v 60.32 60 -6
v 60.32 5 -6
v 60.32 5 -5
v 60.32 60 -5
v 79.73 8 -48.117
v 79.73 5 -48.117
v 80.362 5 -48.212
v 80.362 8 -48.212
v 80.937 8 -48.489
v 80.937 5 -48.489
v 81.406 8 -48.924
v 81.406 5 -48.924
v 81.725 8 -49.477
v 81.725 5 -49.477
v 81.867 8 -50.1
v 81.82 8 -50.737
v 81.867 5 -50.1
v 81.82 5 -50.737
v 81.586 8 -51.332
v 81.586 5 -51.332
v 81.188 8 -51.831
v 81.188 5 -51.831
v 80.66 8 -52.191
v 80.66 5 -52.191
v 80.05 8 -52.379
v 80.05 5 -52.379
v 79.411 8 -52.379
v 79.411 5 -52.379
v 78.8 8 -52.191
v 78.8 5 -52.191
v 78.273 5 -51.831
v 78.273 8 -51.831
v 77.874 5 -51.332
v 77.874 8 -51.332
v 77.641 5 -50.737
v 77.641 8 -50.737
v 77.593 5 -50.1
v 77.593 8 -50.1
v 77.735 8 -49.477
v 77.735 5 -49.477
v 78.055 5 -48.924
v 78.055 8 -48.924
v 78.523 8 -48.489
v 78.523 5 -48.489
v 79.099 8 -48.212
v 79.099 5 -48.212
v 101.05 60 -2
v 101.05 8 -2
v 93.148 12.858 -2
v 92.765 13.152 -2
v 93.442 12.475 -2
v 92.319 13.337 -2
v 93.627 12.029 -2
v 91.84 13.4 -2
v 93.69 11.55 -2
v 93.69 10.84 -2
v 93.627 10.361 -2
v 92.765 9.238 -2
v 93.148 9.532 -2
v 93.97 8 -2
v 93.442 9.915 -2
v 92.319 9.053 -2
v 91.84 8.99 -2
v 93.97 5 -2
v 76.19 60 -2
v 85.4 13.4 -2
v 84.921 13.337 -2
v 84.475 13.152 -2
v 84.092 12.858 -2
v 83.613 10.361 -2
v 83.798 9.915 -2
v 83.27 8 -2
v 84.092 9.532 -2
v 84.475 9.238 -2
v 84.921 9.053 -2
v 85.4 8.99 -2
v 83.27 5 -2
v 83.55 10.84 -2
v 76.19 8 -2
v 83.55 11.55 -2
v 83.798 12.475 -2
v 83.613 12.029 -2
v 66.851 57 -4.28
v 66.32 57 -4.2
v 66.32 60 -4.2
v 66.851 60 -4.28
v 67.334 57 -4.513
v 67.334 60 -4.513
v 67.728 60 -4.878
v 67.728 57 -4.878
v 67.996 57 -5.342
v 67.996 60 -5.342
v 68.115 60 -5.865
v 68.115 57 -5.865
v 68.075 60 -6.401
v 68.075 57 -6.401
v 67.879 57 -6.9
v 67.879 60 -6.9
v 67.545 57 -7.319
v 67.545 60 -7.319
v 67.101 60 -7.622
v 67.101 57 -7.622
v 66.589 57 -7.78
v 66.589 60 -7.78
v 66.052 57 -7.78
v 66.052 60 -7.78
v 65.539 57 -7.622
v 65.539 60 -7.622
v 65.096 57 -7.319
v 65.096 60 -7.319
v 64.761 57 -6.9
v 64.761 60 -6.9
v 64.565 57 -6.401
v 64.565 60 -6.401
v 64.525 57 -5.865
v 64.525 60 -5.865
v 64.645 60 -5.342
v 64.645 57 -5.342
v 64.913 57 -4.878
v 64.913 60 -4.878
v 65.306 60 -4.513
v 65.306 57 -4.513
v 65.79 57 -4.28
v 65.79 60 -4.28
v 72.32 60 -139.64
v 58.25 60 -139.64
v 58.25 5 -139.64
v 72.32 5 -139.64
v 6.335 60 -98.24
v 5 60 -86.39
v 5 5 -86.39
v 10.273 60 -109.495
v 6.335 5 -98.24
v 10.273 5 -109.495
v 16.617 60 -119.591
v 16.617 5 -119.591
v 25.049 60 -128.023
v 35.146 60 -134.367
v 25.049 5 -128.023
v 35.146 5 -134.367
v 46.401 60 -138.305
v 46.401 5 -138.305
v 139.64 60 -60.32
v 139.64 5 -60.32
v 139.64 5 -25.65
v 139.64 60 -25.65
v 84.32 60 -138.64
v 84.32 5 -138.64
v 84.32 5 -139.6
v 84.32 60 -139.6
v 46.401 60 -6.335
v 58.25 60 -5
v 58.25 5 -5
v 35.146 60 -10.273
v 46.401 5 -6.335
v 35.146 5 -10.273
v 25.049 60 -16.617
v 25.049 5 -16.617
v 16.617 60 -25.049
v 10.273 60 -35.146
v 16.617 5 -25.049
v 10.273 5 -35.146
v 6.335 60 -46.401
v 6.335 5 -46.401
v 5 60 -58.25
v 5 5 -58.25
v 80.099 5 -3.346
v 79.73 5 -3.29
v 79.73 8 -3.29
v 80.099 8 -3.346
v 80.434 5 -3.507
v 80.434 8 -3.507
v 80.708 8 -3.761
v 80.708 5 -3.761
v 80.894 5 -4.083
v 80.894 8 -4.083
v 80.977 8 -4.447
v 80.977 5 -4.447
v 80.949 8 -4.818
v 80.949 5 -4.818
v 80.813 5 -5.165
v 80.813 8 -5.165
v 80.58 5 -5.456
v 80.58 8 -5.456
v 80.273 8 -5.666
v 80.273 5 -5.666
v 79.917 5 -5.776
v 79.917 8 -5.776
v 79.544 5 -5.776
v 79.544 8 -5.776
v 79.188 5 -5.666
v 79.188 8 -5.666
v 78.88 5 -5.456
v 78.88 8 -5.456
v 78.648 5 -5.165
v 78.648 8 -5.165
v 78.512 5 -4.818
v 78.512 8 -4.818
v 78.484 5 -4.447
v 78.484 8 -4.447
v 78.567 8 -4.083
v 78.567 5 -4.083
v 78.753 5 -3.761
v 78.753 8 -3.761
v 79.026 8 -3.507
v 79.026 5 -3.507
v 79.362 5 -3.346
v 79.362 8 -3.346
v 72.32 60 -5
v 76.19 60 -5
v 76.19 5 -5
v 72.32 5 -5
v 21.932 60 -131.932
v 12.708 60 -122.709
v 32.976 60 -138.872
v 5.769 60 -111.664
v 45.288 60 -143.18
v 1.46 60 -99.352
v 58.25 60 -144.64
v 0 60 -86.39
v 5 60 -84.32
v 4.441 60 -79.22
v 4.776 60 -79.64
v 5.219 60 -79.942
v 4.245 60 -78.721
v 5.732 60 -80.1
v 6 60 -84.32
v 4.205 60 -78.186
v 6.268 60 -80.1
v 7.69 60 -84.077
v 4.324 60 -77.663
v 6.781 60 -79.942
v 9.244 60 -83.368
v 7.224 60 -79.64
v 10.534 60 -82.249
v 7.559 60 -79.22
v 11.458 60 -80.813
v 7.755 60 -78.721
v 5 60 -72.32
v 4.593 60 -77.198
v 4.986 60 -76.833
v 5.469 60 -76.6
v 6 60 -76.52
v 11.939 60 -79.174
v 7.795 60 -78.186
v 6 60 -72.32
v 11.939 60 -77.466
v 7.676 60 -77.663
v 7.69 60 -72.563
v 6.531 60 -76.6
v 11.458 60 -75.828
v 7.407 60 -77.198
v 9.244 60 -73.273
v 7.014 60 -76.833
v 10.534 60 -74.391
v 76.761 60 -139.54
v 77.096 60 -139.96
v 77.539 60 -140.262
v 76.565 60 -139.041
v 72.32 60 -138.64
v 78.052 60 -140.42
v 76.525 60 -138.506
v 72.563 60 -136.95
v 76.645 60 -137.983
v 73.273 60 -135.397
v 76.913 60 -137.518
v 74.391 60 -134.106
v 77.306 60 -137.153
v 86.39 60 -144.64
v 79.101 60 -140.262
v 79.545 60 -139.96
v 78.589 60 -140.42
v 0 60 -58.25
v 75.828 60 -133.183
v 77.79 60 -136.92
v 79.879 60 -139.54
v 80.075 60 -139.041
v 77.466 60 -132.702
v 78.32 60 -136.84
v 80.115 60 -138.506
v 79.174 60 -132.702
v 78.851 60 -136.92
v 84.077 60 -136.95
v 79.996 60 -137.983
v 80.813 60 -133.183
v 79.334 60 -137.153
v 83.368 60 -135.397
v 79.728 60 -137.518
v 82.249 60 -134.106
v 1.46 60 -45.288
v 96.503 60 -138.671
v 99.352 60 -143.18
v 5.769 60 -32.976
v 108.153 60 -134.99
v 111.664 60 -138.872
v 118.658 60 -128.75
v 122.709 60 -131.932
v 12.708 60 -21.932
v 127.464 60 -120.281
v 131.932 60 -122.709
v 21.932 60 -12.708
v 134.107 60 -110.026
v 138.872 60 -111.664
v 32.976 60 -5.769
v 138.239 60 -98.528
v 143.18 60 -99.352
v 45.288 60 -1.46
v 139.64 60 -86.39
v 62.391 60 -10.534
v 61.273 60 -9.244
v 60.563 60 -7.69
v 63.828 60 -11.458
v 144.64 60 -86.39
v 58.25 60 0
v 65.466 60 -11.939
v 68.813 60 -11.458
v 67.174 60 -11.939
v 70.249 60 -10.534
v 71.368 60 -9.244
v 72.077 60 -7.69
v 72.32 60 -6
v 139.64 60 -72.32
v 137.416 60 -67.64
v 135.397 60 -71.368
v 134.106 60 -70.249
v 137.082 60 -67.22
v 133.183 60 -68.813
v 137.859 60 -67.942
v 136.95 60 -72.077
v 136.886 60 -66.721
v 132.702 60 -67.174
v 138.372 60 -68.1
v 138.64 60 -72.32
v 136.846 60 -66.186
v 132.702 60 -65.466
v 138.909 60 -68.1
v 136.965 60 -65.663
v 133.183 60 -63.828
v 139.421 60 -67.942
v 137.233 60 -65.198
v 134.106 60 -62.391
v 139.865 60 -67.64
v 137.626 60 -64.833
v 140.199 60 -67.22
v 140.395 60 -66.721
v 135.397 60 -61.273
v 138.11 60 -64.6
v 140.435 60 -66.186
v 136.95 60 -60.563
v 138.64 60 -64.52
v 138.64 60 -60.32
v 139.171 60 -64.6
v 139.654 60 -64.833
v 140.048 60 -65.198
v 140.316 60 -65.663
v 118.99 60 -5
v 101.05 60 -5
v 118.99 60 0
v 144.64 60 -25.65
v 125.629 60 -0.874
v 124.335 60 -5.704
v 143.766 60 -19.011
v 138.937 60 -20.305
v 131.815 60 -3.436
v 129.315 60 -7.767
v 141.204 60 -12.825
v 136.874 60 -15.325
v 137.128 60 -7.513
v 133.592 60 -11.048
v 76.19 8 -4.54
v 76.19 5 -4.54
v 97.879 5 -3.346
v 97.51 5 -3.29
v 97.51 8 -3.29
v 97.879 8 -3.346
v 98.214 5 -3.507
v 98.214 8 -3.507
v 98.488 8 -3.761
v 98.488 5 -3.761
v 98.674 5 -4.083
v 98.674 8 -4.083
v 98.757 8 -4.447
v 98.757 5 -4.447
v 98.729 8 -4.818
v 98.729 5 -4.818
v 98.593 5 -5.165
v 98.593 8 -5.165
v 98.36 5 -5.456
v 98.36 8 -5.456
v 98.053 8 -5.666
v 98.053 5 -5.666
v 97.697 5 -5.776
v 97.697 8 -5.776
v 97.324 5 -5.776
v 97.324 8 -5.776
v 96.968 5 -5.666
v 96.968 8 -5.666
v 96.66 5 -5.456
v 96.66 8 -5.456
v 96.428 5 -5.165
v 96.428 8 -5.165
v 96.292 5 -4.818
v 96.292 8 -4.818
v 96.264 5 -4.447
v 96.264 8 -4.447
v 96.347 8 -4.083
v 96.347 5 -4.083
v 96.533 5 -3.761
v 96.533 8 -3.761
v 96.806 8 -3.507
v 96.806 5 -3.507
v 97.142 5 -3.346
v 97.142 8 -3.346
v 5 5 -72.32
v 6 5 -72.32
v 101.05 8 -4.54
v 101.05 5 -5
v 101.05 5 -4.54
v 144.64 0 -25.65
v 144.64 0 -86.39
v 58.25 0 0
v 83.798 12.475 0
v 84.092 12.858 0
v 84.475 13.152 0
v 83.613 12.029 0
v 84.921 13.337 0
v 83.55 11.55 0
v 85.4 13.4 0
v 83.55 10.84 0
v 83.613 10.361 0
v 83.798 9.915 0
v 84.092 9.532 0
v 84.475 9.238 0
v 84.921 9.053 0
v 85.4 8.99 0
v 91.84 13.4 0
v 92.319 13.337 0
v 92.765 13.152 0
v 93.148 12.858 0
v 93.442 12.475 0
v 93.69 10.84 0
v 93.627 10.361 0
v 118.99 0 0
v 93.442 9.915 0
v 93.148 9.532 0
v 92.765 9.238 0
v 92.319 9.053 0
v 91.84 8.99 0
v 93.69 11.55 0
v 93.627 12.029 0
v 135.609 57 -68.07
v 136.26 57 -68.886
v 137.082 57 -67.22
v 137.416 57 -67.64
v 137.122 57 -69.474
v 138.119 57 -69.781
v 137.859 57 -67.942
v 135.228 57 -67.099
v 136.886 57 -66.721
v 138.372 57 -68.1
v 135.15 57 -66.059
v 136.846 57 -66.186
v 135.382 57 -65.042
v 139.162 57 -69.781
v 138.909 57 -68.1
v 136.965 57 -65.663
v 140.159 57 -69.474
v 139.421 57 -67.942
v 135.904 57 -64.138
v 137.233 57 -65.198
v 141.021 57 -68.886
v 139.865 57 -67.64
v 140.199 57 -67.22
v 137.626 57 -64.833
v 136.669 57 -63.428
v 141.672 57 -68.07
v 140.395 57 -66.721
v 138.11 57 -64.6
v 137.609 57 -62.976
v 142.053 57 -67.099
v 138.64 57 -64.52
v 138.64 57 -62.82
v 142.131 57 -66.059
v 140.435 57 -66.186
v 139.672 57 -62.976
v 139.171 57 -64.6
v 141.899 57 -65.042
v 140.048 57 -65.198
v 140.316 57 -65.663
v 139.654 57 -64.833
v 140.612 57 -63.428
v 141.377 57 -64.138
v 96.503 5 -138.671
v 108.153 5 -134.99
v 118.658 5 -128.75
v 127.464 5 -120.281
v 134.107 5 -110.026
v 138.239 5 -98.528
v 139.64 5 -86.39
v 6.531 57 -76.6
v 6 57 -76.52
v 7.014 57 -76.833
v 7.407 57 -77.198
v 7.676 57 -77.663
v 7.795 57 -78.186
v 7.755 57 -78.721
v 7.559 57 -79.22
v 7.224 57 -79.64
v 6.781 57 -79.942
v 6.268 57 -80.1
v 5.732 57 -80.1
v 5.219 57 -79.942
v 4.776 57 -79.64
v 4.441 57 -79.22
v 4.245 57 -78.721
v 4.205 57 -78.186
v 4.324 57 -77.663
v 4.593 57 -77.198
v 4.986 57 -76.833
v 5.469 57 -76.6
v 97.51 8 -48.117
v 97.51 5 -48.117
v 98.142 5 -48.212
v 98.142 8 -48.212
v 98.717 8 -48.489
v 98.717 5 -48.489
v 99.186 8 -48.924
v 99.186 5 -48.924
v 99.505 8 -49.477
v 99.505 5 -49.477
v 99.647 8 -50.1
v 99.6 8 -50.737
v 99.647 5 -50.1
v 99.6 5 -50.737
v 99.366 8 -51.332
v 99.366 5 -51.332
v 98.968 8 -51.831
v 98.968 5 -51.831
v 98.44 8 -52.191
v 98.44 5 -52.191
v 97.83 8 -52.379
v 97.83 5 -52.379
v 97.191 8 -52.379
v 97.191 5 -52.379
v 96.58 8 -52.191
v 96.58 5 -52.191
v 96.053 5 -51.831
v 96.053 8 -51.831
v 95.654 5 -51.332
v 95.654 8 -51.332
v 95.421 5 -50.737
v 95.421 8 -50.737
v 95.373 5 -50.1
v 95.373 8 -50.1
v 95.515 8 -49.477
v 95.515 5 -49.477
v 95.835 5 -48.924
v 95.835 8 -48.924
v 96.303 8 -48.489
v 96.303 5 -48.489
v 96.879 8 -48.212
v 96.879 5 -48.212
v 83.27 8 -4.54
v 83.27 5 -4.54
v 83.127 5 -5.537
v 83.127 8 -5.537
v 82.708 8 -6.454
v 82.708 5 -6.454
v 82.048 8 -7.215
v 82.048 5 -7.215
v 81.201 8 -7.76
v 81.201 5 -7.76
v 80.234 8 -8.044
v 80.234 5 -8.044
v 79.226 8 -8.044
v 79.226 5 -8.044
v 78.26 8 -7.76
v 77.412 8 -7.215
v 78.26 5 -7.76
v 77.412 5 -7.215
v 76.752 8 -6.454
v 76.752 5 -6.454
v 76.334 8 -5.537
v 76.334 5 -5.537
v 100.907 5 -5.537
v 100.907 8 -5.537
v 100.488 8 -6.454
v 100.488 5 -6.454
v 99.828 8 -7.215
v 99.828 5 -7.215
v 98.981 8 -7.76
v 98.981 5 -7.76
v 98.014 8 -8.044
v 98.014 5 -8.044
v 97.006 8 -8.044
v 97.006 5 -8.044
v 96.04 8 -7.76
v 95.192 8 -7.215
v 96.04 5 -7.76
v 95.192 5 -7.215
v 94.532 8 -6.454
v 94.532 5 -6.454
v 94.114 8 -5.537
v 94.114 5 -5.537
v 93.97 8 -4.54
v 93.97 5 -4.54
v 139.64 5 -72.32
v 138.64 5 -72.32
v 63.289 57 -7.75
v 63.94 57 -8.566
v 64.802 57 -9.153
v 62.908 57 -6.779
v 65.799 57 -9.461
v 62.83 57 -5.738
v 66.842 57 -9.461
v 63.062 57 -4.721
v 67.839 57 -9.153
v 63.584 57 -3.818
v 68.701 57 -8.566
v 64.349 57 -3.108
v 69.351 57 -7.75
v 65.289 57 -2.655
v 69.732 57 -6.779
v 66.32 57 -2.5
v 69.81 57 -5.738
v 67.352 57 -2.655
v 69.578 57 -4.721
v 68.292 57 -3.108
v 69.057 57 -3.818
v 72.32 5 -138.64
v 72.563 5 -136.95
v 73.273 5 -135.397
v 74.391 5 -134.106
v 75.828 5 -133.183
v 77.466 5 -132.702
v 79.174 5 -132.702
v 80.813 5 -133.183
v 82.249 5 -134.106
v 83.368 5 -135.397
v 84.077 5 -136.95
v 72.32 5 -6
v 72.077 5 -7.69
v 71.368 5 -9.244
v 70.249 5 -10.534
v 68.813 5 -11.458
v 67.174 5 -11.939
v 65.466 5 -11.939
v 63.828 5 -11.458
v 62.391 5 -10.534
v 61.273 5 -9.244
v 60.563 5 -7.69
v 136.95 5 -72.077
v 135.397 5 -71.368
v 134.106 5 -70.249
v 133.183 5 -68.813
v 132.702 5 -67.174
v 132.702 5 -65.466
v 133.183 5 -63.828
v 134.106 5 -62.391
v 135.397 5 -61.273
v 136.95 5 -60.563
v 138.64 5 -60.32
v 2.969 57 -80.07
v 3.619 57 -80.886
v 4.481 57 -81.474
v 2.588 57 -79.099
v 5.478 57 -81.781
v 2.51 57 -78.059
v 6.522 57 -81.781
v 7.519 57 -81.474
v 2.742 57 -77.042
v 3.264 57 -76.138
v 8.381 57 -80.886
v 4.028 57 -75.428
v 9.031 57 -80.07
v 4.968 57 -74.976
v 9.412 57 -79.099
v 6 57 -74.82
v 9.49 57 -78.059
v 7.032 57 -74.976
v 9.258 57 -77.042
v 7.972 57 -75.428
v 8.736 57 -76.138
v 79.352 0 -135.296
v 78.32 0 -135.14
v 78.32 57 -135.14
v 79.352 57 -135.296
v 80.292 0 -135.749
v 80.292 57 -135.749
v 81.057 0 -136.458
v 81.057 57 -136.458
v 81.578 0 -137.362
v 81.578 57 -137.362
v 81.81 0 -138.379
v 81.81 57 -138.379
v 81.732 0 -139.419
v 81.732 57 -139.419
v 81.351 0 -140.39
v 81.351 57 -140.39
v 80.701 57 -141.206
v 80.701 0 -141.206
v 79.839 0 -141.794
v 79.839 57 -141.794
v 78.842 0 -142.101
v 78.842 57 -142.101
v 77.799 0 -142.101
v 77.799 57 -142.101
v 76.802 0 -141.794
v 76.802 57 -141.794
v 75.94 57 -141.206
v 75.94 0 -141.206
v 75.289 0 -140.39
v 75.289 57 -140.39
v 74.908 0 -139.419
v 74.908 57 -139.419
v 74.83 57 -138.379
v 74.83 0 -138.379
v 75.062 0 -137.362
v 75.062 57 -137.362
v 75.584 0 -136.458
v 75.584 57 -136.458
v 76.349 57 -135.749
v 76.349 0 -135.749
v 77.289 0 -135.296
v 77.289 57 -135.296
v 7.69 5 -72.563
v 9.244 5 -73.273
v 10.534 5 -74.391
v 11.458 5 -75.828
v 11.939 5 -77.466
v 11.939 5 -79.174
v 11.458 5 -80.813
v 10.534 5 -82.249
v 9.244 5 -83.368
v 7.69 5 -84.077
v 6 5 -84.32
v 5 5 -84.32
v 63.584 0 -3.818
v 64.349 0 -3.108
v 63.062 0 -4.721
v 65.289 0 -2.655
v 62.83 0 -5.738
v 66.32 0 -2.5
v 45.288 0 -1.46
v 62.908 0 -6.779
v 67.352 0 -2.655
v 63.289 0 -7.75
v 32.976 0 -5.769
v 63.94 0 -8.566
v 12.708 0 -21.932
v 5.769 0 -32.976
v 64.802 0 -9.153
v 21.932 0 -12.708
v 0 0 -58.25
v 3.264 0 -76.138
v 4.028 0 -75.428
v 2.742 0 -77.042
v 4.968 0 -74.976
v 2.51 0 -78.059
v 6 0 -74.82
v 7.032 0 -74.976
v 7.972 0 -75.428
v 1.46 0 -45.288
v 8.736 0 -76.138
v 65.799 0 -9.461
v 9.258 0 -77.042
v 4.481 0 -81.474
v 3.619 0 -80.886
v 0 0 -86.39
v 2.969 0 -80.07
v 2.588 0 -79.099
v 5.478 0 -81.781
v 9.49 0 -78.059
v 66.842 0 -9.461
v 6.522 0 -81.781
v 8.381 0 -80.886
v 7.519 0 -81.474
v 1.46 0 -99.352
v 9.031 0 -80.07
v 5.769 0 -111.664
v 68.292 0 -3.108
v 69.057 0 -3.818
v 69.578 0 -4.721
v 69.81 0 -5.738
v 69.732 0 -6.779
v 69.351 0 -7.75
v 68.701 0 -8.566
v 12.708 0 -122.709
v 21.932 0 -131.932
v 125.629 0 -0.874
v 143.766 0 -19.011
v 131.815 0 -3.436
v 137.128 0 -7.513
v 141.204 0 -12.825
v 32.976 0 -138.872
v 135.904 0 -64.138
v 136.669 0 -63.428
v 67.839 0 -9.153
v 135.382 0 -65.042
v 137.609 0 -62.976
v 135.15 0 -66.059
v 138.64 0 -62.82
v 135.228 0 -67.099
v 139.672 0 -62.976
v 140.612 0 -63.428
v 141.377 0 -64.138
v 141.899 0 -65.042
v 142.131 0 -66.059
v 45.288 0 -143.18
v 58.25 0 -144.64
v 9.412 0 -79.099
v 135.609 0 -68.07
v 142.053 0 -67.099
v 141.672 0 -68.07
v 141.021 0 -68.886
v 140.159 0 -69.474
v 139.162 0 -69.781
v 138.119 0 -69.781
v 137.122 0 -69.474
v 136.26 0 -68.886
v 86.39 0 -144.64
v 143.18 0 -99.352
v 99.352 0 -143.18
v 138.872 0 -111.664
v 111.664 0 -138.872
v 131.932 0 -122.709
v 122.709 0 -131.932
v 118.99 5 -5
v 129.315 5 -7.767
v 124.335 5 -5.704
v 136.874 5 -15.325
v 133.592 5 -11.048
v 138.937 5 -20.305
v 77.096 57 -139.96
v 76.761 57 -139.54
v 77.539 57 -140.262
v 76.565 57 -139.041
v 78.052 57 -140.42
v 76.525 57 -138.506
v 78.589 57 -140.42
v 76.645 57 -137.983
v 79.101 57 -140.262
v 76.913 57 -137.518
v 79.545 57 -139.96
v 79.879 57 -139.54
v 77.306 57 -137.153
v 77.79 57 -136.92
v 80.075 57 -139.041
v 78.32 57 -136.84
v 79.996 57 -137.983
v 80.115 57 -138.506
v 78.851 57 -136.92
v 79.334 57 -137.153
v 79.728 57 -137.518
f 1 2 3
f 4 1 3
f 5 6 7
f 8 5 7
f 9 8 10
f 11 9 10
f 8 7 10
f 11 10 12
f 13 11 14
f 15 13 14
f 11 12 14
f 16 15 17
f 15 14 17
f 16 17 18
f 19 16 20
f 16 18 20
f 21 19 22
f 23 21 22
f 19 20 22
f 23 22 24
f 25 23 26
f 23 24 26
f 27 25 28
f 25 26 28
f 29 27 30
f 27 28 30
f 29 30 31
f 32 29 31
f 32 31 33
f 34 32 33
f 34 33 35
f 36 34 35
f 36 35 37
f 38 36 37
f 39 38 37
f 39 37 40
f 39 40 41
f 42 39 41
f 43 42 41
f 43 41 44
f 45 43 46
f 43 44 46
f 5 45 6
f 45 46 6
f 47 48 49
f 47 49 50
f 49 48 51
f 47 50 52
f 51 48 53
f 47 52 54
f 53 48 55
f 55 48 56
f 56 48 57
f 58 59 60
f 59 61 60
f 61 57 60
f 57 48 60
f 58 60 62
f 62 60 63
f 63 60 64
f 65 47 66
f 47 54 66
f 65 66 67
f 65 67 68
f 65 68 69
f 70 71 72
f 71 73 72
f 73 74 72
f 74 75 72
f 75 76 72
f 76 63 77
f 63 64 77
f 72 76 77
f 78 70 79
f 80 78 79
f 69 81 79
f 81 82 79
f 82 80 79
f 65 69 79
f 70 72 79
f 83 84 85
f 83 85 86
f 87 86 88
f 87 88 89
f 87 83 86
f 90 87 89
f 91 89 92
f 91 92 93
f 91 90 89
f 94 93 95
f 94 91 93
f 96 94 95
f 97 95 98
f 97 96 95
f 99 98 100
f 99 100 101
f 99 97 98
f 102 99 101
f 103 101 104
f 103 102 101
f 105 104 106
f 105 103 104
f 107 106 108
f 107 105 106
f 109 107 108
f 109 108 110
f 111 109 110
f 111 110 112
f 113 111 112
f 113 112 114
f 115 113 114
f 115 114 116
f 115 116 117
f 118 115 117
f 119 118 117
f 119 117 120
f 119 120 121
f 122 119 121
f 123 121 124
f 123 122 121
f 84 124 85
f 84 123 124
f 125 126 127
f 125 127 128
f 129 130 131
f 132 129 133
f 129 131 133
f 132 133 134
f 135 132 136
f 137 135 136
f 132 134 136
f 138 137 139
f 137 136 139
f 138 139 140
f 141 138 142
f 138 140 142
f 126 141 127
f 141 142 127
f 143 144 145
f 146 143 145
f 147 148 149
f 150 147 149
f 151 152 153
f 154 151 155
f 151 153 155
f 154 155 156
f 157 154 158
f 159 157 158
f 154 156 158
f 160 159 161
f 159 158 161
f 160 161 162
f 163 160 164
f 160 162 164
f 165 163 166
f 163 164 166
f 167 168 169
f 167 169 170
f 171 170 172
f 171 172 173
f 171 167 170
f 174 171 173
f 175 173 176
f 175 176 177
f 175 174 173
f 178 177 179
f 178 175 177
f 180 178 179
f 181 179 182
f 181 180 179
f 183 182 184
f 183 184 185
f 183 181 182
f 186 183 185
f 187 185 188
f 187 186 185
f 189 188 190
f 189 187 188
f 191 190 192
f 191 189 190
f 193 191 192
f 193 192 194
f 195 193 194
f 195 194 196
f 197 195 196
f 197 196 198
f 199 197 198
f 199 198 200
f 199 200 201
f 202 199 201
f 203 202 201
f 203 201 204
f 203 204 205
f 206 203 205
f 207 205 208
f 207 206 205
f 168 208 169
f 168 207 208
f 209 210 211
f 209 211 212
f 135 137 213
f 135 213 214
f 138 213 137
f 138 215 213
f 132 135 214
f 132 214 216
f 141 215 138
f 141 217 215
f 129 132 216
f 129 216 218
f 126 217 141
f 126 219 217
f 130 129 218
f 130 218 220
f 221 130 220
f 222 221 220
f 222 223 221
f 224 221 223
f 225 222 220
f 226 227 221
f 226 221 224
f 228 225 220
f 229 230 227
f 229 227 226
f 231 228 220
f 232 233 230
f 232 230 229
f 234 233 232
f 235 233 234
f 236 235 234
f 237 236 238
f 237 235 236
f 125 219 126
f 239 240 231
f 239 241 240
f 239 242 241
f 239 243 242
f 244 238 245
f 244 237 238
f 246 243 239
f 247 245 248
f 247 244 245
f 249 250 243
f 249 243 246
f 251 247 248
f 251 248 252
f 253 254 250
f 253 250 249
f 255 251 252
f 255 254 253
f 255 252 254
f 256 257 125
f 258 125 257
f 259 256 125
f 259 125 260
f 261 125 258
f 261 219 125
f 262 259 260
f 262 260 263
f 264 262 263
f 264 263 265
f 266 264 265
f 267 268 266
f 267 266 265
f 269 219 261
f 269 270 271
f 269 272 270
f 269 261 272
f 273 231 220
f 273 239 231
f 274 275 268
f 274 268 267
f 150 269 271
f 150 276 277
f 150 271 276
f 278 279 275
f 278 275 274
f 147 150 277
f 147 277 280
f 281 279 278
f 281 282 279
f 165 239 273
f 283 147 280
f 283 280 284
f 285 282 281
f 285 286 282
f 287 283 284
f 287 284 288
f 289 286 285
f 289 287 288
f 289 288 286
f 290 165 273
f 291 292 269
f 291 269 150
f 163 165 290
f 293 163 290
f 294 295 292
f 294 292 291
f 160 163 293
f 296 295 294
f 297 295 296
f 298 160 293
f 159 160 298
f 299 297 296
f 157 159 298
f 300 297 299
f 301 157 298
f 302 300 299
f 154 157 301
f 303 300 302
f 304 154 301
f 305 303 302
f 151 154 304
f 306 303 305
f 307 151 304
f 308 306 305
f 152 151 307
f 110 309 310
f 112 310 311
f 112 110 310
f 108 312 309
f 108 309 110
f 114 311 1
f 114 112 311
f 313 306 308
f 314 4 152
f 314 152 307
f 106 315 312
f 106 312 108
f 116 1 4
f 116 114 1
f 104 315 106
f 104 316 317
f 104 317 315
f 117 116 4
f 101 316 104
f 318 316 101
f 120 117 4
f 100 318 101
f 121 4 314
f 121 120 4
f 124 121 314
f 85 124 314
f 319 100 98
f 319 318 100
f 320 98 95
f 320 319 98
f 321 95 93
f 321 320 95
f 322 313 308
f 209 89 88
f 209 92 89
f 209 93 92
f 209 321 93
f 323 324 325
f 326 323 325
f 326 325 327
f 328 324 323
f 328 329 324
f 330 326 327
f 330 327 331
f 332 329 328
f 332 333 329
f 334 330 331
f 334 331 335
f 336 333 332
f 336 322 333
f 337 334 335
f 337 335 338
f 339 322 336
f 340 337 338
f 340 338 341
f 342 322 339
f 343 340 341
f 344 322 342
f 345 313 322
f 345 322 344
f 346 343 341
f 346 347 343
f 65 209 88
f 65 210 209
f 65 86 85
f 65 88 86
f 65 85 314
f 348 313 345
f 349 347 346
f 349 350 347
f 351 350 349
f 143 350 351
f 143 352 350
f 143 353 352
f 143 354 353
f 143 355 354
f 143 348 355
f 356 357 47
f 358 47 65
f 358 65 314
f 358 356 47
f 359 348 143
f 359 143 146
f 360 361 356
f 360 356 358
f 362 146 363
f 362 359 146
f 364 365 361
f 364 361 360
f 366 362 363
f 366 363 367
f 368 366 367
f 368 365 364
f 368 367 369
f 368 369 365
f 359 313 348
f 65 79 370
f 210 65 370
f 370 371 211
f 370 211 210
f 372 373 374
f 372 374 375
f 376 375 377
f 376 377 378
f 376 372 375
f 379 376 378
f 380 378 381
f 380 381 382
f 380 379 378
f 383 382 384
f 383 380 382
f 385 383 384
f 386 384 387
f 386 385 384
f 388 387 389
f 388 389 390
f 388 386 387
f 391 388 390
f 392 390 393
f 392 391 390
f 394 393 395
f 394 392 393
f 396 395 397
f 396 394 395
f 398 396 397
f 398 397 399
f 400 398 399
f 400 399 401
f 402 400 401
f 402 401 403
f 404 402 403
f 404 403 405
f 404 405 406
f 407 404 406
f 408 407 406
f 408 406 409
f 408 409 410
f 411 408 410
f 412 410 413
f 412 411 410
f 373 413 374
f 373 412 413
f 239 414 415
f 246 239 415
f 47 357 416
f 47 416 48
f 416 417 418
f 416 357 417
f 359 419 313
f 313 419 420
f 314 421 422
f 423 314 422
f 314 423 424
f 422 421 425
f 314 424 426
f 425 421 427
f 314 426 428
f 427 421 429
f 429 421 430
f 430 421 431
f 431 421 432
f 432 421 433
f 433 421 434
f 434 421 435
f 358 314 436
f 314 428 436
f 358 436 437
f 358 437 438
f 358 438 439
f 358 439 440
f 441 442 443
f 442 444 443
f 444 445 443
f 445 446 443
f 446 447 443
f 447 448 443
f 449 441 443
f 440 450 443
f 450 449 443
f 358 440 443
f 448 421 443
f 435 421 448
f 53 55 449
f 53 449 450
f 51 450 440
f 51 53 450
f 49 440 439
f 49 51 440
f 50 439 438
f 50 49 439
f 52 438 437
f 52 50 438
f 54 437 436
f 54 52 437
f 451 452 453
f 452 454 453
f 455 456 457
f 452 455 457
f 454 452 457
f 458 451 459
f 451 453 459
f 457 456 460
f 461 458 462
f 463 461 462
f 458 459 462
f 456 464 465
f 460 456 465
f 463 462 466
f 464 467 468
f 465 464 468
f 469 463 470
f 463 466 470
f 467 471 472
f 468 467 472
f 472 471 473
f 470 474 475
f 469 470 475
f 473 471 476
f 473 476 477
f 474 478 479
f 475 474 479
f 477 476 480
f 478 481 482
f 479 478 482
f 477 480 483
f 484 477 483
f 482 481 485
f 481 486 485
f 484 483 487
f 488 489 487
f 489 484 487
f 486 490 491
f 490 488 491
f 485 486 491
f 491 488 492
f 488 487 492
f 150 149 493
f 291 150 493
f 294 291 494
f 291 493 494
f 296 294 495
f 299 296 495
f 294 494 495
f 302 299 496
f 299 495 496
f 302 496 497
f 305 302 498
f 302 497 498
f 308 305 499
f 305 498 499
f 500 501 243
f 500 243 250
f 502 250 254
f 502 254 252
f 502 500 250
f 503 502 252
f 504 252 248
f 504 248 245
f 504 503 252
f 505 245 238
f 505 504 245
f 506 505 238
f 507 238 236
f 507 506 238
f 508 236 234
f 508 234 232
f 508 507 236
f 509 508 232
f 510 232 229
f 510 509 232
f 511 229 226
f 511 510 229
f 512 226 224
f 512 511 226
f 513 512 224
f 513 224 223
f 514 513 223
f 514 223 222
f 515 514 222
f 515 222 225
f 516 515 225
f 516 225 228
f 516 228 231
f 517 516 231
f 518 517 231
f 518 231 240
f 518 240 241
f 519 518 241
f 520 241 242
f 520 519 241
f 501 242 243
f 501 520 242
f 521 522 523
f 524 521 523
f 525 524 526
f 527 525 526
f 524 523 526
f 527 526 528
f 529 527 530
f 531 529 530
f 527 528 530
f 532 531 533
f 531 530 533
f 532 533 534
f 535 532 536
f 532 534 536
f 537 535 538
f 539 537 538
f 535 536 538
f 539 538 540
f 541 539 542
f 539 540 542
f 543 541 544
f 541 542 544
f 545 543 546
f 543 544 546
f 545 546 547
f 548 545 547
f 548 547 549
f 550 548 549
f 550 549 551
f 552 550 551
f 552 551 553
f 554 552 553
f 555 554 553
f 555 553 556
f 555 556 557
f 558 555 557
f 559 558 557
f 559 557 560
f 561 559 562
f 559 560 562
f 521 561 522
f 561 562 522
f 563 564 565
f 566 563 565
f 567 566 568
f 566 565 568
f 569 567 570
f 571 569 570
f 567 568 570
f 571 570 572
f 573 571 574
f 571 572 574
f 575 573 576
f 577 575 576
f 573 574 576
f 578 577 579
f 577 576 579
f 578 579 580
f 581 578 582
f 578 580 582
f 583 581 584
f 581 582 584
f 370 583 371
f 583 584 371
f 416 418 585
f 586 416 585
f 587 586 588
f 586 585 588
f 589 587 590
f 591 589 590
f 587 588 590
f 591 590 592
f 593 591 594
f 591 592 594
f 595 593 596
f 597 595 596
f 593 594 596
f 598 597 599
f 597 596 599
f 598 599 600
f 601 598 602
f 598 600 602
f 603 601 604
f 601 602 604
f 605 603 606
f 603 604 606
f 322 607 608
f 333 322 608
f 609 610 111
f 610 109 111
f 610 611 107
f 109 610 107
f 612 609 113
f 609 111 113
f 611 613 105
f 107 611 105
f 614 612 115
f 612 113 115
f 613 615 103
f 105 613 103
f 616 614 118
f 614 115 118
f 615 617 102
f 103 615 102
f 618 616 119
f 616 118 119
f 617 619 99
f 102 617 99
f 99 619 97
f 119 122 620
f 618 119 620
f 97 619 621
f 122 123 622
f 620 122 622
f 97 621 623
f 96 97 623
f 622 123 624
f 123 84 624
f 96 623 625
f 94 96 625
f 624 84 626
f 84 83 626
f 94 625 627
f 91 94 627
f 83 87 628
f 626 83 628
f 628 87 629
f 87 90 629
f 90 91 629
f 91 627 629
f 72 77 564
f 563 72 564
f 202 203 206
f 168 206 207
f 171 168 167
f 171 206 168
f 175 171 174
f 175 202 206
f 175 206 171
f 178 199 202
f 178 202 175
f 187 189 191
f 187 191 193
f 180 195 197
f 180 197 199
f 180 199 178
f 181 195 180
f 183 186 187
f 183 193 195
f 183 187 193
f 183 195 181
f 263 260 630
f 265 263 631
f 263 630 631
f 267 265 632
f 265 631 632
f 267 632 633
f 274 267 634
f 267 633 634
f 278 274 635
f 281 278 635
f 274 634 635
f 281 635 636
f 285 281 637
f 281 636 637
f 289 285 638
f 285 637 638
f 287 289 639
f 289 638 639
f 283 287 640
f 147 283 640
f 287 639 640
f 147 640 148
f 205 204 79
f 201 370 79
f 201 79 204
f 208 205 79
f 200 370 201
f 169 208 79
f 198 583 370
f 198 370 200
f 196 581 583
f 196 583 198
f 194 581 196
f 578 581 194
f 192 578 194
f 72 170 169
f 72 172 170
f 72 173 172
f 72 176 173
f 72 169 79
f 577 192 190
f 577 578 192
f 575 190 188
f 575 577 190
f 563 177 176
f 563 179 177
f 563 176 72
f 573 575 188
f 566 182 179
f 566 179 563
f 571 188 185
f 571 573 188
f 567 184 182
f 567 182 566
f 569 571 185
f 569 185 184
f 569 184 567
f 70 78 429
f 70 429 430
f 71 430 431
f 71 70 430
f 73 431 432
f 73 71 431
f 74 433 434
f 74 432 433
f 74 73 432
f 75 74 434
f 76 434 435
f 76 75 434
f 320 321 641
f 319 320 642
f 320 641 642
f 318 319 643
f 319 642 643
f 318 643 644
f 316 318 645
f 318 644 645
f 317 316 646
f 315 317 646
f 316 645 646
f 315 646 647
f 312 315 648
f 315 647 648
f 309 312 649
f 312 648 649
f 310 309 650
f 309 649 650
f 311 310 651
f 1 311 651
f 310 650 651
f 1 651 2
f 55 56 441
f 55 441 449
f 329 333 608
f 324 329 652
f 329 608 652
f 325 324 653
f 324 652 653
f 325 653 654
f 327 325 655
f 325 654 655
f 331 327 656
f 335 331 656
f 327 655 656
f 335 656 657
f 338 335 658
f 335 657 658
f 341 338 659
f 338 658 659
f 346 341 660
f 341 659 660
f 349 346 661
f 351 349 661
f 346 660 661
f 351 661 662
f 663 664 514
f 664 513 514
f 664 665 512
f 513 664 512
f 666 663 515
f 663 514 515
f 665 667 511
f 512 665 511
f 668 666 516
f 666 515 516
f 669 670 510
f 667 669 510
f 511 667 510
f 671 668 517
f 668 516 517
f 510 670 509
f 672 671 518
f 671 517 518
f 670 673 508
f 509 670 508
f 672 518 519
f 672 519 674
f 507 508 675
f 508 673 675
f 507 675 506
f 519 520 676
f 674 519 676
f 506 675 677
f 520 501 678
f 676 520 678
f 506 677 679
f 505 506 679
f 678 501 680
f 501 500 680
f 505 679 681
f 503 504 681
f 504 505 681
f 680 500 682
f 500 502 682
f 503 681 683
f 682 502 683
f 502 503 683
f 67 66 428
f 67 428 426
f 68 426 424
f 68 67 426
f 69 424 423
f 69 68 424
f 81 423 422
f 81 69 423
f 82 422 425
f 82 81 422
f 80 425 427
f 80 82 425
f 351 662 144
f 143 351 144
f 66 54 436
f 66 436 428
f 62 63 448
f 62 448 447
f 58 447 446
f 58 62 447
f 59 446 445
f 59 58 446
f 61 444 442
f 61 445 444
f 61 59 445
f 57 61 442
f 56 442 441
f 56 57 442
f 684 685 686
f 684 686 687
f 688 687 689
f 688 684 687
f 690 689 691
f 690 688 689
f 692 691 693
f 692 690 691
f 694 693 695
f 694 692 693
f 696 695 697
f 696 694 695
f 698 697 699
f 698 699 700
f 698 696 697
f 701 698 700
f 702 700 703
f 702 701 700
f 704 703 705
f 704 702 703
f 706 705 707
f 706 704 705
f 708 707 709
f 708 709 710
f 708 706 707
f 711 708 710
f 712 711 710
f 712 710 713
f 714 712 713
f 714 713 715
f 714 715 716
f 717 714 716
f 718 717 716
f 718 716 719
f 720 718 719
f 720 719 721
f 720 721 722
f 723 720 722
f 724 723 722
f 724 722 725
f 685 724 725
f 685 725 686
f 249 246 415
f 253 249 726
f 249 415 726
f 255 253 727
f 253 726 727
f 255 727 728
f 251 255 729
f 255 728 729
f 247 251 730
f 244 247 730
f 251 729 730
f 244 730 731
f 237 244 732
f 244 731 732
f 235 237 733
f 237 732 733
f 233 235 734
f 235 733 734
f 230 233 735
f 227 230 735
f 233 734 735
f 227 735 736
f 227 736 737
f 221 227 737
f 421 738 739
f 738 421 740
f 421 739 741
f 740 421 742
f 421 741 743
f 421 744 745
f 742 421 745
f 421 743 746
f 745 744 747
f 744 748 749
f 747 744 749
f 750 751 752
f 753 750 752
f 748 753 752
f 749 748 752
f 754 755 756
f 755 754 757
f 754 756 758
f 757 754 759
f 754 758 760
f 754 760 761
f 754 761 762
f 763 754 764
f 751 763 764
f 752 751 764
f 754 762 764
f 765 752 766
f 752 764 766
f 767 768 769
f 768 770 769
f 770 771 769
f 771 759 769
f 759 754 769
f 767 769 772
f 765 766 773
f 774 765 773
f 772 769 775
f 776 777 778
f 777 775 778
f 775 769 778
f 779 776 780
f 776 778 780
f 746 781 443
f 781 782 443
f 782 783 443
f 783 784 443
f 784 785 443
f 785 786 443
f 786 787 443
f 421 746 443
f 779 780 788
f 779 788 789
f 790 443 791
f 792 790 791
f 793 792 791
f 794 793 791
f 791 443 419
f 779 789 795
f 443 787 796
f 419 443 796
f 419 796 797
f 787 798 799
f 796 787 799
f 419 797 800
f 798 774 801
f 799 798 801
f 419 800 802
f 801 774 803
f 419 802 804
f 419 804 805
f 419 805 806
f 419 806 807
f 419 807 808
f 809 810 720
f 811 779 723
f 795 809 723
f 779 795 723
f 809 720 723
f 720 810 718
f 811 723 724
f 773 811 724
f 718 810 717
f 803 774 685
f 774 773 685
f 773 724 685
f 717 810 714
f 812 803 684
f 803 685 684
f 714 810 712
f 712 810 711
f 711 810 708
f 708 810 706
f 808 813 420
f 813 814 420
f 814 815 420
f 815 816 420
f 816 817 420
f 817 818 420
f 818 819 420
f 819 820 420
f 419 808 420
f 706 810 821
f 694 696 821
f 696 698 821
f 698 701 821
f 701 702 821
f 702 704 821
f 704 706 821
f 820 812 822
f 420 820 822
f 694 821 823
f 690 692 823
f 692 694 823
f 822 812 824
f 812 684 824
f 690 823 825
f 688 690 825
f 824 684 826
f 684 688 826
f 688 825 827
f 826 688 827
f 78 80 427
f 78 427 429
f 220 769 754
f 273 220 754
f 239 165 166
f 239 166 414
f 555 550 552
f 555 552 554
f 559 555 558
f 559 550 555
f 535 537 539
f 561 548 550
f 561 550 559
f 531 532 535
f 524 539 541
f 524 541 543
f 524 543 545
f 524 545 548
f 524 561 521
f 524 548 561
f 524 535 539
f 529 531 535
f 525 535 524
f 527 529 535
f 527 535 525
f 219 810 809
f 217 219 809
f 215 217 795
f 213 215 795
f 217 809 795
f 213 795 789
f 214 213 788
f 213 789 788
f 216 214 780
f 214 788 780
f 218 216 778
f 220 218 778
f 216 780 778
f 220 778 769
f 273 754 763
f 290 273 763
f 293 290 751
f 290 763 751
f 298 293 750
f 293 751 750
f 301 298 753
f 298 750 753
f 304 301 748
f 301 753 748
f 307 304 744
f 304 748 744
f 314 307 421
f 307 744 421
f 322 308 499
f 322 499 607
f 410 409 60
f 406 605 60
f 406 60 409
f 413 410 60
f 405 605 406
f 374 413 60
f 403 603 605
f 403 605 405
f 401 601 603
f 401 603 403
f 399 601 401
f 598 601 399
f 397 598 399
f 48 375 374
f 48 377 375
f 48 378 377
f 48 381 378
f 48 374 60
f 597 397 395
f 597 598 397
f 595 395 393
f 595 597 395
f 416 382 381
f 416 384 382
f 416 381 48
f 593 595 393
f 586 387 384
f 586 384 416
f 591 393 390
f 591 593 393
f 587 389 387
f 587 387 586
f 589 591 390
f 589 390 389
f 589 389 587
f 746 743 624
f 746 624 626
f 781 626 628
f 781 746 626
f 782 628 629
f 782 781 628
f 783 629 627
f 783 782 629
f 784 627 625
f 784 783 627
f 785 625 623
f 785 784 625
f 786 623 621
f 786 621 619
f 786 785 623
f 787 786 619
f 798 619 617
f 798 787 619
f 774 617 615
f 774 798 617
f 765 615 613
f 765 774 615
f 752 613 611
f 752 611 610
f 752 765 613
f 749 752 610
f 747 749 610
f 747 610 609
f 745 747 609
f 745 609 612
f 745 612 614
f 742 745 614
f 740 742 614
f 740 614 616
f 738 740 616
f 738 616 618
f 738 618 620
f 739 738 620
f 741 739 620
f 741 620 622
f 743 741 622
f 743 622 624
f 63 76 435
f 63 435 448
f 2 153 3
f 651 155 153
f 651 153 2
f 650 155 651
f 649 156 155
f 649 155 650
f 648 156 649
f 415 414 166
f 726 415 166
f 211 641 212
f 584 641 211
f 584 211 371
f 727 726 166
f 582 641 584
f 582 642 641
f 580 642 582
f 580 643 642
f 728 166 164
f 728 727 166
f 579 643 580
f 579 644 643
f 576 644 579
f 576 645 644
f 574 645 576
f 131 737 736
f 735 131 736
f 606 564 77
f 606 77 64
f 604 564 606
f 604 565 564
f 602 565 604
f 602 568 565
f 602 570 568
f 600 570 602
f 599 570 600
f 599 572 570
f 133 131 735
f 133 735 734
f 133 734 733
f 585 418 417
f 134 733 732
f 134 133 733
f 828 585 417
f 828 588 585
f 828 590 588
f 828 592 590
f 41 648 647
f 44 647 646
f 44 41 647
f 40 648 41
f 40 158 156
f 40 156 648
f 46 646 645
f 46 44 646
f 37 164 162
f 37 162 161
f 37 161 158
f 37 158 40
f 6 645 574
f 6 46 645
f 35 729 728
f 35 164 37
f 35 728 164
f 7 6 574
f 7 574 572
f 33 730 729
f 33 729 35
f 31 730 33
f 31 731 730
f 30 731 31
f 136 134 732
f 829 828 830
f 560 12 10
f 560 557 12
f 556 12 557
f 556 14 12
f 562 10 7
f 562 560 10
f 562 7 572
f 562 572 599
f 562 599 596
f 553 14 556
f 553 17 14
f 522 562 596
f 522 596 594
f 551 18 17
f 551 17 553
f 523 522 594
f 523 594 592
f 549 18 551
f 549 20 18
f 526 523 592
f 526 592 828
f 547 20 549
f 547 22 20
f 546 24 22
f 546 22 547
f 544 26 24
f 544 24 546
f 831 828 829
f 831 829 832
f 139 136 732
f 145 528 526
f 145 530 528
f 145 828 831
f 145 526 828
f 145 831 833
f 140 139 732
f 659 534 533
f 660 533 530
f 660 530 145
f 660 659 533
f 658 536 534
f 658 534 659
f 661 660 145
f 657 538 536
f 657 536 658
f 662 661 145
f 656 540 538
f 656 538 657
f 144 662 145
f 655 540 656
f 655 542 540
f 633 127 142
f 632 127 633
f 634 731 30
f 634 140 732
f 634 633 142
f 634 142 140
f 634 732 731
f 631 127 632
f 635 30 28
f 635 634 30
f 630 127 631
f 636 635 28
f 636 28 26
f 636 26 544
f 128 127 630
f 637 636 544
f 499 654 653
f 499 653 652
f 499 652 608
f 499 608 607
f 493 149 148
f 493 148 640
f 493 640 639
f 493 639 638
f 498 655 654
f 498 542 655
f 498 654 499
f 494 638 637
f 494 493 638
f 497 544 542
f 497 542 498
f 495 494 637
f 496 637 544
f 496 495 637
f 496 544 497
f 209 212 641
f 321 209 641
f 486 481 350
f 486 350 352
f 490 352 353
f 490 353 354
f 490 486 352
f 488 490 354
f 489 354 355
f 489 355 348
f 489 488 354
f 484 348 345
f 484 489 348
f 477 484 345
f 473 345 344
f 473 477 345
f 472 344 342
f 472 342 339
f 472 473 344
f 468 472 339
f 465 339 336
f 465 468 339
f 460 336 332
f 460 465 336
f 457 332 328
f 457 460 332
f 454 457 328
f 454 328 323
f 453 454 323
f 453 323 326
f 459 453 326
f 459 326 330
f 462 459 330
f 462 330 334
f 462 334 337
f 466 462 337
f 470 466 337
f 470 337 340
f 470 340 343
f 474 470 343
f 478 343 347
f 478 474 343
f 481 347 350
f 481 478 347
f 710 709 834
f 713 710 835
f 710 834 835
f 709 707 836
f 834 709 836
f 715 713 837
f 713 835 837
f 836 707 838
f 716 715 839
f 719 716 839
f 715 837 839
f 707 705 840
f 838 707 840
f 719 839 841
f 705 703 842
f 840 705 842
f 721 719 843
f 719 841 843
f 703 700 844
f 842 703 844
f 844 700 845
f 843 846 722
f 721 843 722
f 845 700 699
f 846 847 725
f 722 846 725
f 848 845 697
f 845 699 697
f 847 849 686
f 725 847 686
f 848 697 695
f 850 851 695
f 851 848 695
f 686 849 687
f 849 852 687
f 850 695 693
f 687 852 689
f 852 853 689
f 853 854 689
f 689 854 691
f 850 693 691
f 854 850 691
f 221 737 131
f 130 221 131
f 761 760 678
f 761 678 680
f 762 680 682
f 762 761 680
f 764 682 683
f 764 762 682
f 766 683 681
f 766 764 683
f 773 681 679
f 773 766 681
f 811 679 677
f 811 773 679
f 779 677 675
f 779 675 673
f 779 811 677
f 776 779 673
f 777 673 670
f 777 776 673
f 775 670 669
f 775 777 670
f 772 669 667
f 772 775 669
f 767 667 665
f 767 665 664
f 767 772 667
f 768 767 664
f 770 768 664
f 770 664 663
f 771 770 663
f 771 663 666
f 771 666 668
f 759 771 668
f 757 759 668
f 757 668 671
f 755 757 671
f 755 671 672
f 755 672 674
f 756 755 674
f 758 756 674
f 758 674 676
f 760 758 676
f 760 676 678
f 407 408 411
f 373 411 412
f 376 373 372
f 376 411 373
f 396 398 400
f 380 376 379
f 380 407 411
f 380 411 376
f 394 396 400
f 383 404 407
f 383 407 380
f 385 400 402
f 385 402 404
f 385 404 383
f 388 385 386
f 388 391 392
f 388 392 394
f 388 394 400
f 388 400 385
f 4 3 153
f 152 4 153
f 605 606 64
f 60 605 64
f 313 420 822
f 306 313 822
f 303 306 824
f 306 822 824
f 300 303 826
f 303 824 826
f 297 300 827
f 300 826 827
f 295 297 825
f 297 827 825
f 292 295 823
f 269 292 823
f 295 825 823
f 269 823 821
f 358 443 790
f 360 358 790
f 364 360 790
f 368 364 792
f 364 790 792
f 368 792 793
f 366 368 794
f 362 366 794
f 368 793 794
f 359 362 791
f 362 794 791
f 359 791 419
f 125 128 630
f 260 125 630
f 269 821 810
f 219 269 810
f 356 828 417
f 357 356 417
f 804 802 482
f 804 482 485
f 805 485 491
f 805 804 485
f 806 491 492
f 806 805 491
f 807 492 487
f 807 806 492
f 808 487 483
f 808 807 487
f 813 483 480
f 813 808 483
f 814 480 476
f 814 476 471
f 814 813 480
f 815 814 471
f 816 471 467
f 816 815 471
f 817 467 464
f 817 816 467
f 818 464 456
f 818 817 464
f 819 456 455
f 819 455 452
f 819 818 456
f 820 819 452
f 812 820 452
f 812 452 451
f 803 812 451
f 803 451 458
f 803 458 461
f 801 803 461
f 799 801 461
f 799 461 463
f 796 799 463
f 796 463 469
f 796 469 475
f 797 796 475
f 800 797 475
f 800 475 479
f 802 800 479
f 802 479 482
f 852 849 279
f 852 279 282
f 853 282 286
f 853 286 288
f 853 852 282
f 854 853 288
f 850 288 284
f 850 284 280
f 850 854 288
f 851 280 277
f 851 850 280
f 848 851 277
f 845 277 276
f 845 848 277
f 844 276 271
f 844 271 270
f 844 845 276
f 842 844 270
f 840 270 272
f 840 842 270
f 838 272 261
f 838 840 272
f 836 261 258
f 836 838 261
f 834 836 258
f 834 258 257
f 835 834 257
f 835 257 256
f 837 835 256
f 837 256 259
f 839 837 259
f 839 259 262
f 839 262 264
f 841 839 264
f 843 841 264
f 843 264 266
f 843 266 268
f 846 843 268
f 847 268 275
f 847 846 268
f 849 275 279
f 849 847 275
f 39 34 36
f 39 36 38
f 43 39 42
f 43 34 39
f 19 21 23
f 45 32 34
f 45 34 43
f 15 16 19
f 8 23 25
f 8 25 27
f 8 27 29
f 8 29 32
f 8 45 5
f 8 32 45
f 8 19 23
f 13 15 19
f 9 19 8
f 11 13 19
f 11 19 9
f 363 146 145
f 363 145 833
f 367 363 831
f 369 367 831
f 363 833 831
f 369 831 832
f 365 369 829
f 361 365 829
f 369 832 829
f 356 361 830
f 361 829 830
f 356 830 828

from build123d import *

# Parameters (mm, degrees)
SKETCH1_R           = 3.5
BOSS_EXTRUDE1_DEPTH = 60
BOSS_EXTRUDE2_DEPTH = 5
BOSS_EXTRUDE3_START = 5
SKETCH1_4_R         = 1.25
SKETCH1_4_R_2       = 2.143
BOSS_EXTRUDE3_DEPTH = 3
CUT_EXTRUDE1_REACH  = 213.819
BOSS_EXTRUDE4_START = 57
SKETCH1_6_R         = 3.5
SKETCH1_6_R_2       = 1.8
BOSS_EXTRUDE4_DEPTH = 3


with BuildPart() as part:
    # Sketch1 → Boss-Extrude1 (new body)
    with BuildSketch(Plane(origin=(0, 0, 0), x_dir=(1, 0, 0), z_dir=(0, 1, 0))):
        with BuildLine():
            ThreePointArc((0, 58.25), (17.061029996, 17.061029996), (58.25, 0))
            Line((58.25, 0), (118.99047, 0))
            ThreePointArc((118.99047, 0), (137.127758937, 7.512711063), (144.64047, 25.65))
            Line((144.64047, 25.65), (144.64047, 86.39047))
            ThreePointArc((144.64047, 86.39047), (127.579440004, 127.579440004), (86.39047, 144.64047))
            Line((86.39047, 144.64047), (58.25, 144.64047))
            ThreePointArc((58.25, 144.64047), (17.061029996, 127.579440004), (0, 86.39047))
            Line((0, 86.39047), (0, 58.25))
        make_face()
        with Locations(Location((66.320235, 6, 0), (0, 0, 270))):
            Circle(SKETCH1_R, mode=Mode.SUBTRACT)
        with BuildLine():
            ThreePointArc((5, 86.39047), (20.596563902, 124.043906098), (58.25, 139.64047))
            Line((58.25, 139.64047), (72.320235, 139.64047))
            Line((72.320235, 139.64047), (72.320235, 138.64047))
            ThreePointArc((72.320235, 138.64047), (78.320235, 132.64047), (84.320235, 138.64047))
            Line((84.320235, 138.64047), (84.320235, 139.600211843))
            ThreePointArc((84.320235, 139.600211843), (123.304711738, 124.768865705), (139.64047, 86.39047))
            Line((139.64047, 86.39047), (139.64047, 72.320235))
            Line((139.64047, 72.320235), (138.64047, 72.320235))
            ThreePointArc((138.64047, 72.320235), (132.64047, 66.320235), (138.64047, 60.320235))
            Line((138.64047, 60.320235), (139.64047, 60.320235))
            Line((139.64047, 60.320235), (139.64047, 25.65))
            ThreePointArc((139.64047, 25.65), (133.592225032, 11.048244968), (118.99047, 5))
            Line((118.99047, 5), (101.050235, 5))
            Line((101.050235, 5), (101.050235, 4.54))
            Line((101.050235, 4.54), (101.050235, 2))
            Line((101.050235, 2), (100.050235, 2))
            Line((100.050235, 2), (93.970235, 2))
            Line((93.970235, 2), (83.270235, 2))
            Line((83.270235, 2), (77.190235, 2))
            Line((77.190235, 2), (76.190235, 2))
            Line((76.190235, 2), (76.190235, 4.54))
            Line((76.190235, 4.54), (76.190235, 5))
            Line((76.190235, 5), (72.320235, 5))
            Line((72.320235, 5), (72.320235, 6))
            ThreePointArc((72.320235, 6), (66.320235, 12), (60.320235, 6))
            Line((60.320235, 6), (60.320235, 5))
            Line((60.320235, 5), (58.25, 5))
            ThreePointArc((58.25, 5), (20.596563902, 20.596563902), (5, 58.25))
            Line((5, 58.25), (5, 72.320235))
            Line((5, 72.320235), (6, 72.320235))
            ThreePointArc((6, 72.320235), (12, 78.320235), (6, 84.320235))
            Line((6, 84.320235), (5, 84.320235))
            Line((5, 84.320235), (5, 86.39047))
        make_face(mode=Mode.SUBTRACT)
        with Locations(Location((138.64047, 66.320235, 0), (0, 0, 270))):
            Circle(SKETCH1_R, mode=Mode.SUBTRACT)
        with Locations(Location((6, 78.320235, 0), (0, 0, 270))):
            Circle(SKETCH1_R, mode=Mode.SUBTRACT)
        with Locations(Location((78.320235, 138.64047, 0), (0, 0, 270))):
            Circle(SKETCH1_R, mode=Mode.SUBTRACT)
    extrude(amount=BOSS_EXTRUDE1_DEPTH)

    # Sketch1<2> → Boss-Extrude2 (add)
    with BuildSketch(Plane(origin=(0, 0, 0), x_dir=(1, 0, 0), z_dir=(0, 1, 0))):
        with BuildLine():
            Line((72.320235, 139.64047), (58.25, 139.64047))
            ThreePointArc((58.25, 139.64047), (20.596563902, 124.043906098), (5, 86.39047))
            Line((5, 86.39047), (5, 84.320235))
            Line((5, 84.320235), (6, 84.320235))
            ThreePointArc((6, 84.320235), (12, 78.320235), (6, 72.320235))
            Line((6, 72.320235), (5, 72.320235))
            Line((5, 72.320235), (5, 58.25))
            ThreePointArc((5, 58.25), (20.596563902, 20.596563902), (58.25, 5))
            Line((58.25, 5), (60.320235, 5))
            Line((60.320235, 5), (60.320235, 6))
            ThreePointArc((60.320235, 6), (66.320235, 12), (72.320235, 6))
            Line((72.320235, 6), (72.320235, 5))
            Line((72.320235, 5), (76.190235, 5))
            Line((76.190235, 5), (76.190235, 2))
            Line((76.190235, 2), (101.050235, 2))
            Line((101.050235, 2), (101.050235, 5))
            Line((101.050235, 5), (118.99047, 5))
            ThreePointArc((118.99047, 5), (133.592225032, 11.048244968), (139.64047, 25.65))
            Line((139.64047, 25.65), (139.64047, 60.320235))
            Line((139.64047, 60.320235), (138.64047, 60.320235))
            ThreePointArc((138.64047, 60.320235), (132.64047, 66.320235), (138.64047, 72.320235))
            Line((138.64047, 72.320235), (139.64047, 72.320235))
            Line((139.64047, 72.320235), (139.64047, 86.39047))
            ThreePointArc((139.64047, 86.39047), (123.304711738, 124.768865705), (84.320235, 139.600211843))
            Line((84.320235, 139.600211843), (84.320235, 138.64047))
            ThreePointArc((84.320235, 138.64047), (78.320235, 132.64047), (72.320235, 138.64047))
            Line((72.320235, 138.64047), (72.320235, 139.64047))
        make_face()
    extrude(amount=BOSS_EXTRUDE2_DEPTH)

    # Sketch1<4> → Boss-Extrude3 (add)
    # profile 1 of 4: a face of its own
    with BuildSketch(Plane(origin=(0, 0, 0), x_dir=(1, 0, 0), z_dir=(0, 1, 0)).offset(BOSS_EXTRUDE3_START)):
        with BuildLine():
            Line((101.050235, 2), (101.050235, 4.54))
            ThreePointArc((101.050235, 4.54), (97.510235, 8.08), (93.970235, 4.54))
            Line((93.970235, 4.54), (93.970235, 2))
            Line((93.970235, 2), (101.050235, 2))
        make_face()
        with Locations(Location((97.510235, 4.54, 0), (0, 0, 270))):
            Circle(SKETCH1_4_R, mode=Mode.SUBTRACT)
    # profile 2 of 4: a face of its own
    with BuildSketch(Plane(origin=(0, 0, 0), x_dir=(1, 0, 0), z_dir=(0, 1, 0)).offset(BOSS_EXTRUDE3_START)):
        with BuildLine():
            ThreePointArc((83.270235, 4.54), (79.730235, 8.08), (76.190235, 4.54))
            Line((76.190235, 4.54), (76.190235, 2))
            Line((76.190235, 2), (83.270235, 2))
            Line((83.270235, 2), (83.270235, 4.54))
        make_face()
        with Locations(Location((79.730235, 4.54, 0), (0, 0, 270))):
            Circle(SKETCH1_4_R, mode=Mode.SUBTRACT)
    # profile 3 of 4: a face of its own
    with BuildSketch(Plane(origin=(0, 0, 0), x_dir=(1, 0, 0), z_dir=(0, 1, 0)).offset(BOSS_EXTRUDE3_START)):
        with Locations(Location((79.730235, 50.26, 0), (0, 0, 270))):
            Circle(SKETCH1_4_R_2)
    # profile 4 of 4: a face of its own
    with BuildSketch(Plane(origin=(0, 0, 0), x_dir=(1, 0, 0), z_dir=(0, 1, 0)).offset(BOSS_EXTRUDE3_START)):
        with Locations(Location((97.510235, 50.26, 0), (0, 0, 270))):
            Circle(SKETCH1_4_R_2)
    extrude(amount=BOSS_EXTRUDE3_DEPTH)

    # Sketch2 → Cut-Extrude1 (cut, up to next)
    with BuildSketch(Plane(origin=(0, 0, -2), x_dir=(-1, 0, 0), z_dir=(0, 0, -1)), mode=Mode.PRIVATE) as cut_extrude1_sk1:
        with BuildLine():
            Line((-91.840235, 13.4), (-85.400235, 13.4))
            ThreePointArc((-85.400235, 13.4), (-84.092087455, 12.858147545), (-83.550235, 11.55))
            Line((-83.550235, 11.55), (-83.550235, 10.84))
            ThreePointArc((-83.550235, 10.84), (-84.092087455, 9.531852455), (-85.400235, 8.99))
            Line((-85.400235, 8.99), (-91.840235, 8.99))
            ThreePointArc((-91.840235, 8.99), (-93.148382545, 9.531852455), (-93.690235, 10.84))
            Line((-93.690235, 10.84), (-93.690235, 11.55))
            ThreePointArc((-93.690235, 11.55), (-93.148382545, 12.858147545), (-91.840235, 13.4))
        make_face()
    cut_extrude1_tool1 = extrude(cut_extrude1_sk1.sketch, amount=-CUT_EXTRUDE1_REACH, mode=Mode.PRIVATE) & part.part
    add(cut_extrude1_tool1.solids().sort_by_distance((88.620235, 11.195, -2))[0], mode=Mode.SUBTRACT)

    # Sketch1<6> → Boss-Extrude4 (add)
    # profile 1 of 4: a face of its own
    with BuildSketch(Plane(origin=(0, 0, 0), x_dir=(1, 0, 0), z_dir=(0, 1, 0)).offset(BOSS_EXTRUDE4_START)):
        with Locations(Location((6, 78.320235, 0), (0, 0, 270))):
            Circle(SKETCH1_6_R)
        with Locations(Location((6, 78.320235, 0), (0, 0, 270))):
            Circle(SKETCH1_6_R_2, mode=Mode.SUBTRACT)
    # profile 2 of 4: a face of its own
    with BuildSketch(Plane(origin=(0, 0, 0), x_dir=(1, 0, 0), z_dir=(0, 1, 0)).offset(BOSS_EXTRUDE4_START)):
        with Locations(Location((78.320235, 138.64047, 0), (0, 0, 270))):
            Circle(SKETCH1_6_R)
        with Locations(Location((78.320235, 138.64047, 0), (0, 0, 270))):
            Circle(SKETCH1_6_R_2, mode=Mode.SUBTRACT)
    # profile 3 of 4: a face of its own
    with BuildSketch(Plane(origin=(0, 0, 0), x_dir=(1, 0, 0), z_dir=(0, 1, 0)).offset(BOSS_EXTRUDE4_START)):
        with Locations(Location((138.64047, 66.320235, 0), (0, 0, 270))):
            Circle(SKETCH1_6_R)
        with Locations(Location((138.64047, 66.320235, 0), (0, 0, 270))):
            Circle(SKETCH1_6_R_2, mode=Mode.SUBTRACT)
    # profile 4 of 4: a face of its own
    with BuildSketch(Plane(origin=(0, 0, 0), x_dir=(1, 0, 0), z_dir=(0, 1, 0)).offset(BOSS_EXTRUDE4_START)):
        with Locations(Location((66.320235, 6, 0), (0, 0, 270))):
            Circle(SKETCH1_6_R)
        with Locations(Location((66.320235, 6, 0), (0, 0, 270))):
            Circle(SKETCH1_6_R_2, mode=Mode.SUBTRACT)
    extrude(amount=BOSS_EXTRUDE4_DEPTH)


solid = part.part
